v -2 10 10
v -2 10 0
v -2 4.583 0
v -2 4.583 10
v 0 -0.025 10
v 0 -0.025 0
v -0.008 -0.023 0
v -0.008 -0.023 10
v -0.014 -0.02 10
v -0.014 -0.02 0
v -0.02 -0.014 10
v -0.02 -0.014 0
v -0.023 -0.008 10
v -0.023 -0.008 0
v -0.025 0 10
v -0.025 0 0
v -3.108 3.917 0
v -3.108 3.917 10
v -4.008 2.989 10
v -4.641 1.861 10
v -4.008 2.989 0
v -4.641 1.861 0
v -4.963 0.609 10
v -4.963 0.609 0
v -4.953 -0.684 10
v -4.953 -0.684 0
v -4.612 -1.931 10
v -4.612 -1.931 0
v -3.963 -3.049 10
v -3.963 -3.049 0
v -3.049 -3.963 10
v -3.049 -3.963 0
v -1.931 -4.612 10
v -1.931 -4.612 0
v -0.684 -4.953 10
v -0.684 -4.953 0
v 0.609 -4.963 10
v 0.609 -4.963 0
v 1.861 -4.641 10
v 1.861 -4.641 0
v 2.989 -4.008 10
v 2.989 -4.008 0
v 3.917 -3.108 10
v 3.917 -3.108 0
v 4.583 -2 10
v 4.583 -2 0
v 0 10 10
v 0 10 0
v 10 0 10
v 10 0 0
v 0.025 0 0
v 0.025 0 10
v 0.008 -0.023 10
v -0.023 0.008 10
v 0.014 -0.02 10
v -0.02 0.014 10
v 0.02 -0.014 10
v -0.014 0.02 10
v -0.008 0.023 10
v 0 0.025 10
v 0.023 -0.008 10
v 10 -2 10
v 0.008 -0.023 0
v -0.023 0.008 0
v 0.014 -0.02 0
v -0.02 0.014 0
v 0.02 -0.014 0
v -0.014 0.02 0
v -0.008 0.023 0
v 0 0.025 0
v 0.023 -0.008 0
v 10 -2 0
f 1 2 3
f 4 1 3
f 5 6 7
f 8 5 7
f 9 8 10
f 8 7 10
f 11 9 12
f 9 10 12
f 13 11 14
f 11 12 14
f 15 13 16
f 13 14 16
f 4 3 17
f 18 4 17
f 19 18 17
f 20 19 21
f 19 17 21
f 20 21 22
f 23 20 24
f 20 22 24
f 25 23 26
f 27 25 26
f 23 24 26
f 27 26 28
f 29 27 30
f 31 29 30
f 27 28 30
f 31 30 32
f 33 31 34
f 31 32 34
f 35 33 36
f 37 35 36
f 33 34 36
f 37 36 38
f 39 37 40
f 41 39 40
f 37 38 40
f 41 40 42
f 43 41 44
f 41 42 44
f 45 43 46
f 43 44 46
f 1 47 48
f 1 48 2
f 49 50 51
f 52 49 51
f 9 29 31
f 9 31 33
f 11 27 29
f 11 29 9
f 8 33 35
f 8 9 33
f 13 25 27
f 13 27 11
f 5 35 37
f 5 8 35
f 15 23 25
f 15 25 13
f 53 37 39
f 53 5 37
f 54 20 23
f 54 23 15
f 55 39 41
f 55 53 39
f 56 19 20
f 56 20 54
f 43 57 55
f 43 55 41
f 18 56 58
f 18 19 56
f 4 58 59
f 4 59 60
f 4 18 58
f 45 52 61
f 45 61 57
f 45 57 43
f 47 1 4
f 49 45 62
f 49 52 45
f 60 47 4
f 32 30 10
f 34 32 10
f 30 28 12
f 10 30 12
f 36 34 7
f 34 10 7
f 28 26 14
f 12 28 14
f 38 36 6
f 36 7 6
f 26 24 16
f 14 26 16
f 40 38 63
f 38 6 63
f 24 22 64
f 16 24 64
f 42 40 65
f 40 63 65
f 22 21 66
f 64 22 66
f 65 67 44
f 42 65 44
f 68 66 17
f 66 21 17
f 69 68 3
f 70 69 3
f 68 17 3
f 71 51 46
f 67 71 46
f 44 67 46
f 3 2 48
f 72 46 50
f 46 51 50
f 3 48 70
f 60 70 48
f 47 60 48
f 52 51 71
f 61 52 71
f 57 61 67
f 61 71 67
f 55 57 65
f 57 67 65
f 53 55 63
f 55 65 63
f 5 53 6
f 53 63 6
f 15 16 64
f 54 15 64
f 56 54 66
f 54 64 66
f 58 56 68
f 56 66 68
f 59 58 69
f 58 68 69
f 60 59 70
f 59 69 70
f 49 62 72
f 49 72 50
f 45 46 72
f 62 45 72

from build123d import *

# Parameters (mm, degrees)
F1_DEPTH = 10


with BuildPart() as f1:
    # F0 (on Top) → F1 (new body)
    with BuildSketch(Plane.XY):
        with BuildLine():
            Line((-2, 10), (-2, 4.582576))
            ThreePointArc((-2, 4.582576), (-1.021548, 4.894532), (0, 5))
            Line((0, 5), (0, 10))
            Line((0, 10), (-2, 10))
        make_face()
        with BuildLine():
            Line((4.582576, -2), (10, -2))
            Line((10, -2), (10, 0))
            Line((10, 0), (5, 0))
            ThreePointArc((5, 0), (4.894532, -1.021548), (4.582576, -2))
        make_face()
        with BuildLine():
            Line((0, -2), (4.582576, -2))
            ThreePointArc((4.582576, -2), (4.894532, -1.021548), (5, 0))
            Line((5, 0), (0.024659, 0))
            ThreePointArc((0.024659, 0), (0.017436, -0.017436), (0, -0.024659))
            Line((0, -0.024659), (0, -2))
        make_face()
        with BuildLine():
            ThreePointArc((0, 5), (-1.021548, 4.894532), (-2, 4.582576))
            Line((-2, 4.582576), (-2, 0))
            Line((-2, 0), (-0.024659, 0))
            ThreePointArc((-0.024659, 0), (-0.017436, 0.017436), (0, 0.024659))
            Line((0, 0.024659), (0, 5))
        make_face()
        with BuildLine():
            ThreePointArc((-2, 4.582576), (-3.535534, -3.535534), (4.582576, -2))
            Line((4.582576, -2), (0, -2))
            Line((0, -2), (0, -0.024659))
            ThreePointArc((0, -0.024659), (-0.017436, -0.017436), (-0.024659, 0))
            Line((-0.024659, 0), (-2, 0))
            Line((-2, 0), (-2, 4.582576))
        make_face()
    extrude(amount=F1_DEPTH)


solid = f1.part
